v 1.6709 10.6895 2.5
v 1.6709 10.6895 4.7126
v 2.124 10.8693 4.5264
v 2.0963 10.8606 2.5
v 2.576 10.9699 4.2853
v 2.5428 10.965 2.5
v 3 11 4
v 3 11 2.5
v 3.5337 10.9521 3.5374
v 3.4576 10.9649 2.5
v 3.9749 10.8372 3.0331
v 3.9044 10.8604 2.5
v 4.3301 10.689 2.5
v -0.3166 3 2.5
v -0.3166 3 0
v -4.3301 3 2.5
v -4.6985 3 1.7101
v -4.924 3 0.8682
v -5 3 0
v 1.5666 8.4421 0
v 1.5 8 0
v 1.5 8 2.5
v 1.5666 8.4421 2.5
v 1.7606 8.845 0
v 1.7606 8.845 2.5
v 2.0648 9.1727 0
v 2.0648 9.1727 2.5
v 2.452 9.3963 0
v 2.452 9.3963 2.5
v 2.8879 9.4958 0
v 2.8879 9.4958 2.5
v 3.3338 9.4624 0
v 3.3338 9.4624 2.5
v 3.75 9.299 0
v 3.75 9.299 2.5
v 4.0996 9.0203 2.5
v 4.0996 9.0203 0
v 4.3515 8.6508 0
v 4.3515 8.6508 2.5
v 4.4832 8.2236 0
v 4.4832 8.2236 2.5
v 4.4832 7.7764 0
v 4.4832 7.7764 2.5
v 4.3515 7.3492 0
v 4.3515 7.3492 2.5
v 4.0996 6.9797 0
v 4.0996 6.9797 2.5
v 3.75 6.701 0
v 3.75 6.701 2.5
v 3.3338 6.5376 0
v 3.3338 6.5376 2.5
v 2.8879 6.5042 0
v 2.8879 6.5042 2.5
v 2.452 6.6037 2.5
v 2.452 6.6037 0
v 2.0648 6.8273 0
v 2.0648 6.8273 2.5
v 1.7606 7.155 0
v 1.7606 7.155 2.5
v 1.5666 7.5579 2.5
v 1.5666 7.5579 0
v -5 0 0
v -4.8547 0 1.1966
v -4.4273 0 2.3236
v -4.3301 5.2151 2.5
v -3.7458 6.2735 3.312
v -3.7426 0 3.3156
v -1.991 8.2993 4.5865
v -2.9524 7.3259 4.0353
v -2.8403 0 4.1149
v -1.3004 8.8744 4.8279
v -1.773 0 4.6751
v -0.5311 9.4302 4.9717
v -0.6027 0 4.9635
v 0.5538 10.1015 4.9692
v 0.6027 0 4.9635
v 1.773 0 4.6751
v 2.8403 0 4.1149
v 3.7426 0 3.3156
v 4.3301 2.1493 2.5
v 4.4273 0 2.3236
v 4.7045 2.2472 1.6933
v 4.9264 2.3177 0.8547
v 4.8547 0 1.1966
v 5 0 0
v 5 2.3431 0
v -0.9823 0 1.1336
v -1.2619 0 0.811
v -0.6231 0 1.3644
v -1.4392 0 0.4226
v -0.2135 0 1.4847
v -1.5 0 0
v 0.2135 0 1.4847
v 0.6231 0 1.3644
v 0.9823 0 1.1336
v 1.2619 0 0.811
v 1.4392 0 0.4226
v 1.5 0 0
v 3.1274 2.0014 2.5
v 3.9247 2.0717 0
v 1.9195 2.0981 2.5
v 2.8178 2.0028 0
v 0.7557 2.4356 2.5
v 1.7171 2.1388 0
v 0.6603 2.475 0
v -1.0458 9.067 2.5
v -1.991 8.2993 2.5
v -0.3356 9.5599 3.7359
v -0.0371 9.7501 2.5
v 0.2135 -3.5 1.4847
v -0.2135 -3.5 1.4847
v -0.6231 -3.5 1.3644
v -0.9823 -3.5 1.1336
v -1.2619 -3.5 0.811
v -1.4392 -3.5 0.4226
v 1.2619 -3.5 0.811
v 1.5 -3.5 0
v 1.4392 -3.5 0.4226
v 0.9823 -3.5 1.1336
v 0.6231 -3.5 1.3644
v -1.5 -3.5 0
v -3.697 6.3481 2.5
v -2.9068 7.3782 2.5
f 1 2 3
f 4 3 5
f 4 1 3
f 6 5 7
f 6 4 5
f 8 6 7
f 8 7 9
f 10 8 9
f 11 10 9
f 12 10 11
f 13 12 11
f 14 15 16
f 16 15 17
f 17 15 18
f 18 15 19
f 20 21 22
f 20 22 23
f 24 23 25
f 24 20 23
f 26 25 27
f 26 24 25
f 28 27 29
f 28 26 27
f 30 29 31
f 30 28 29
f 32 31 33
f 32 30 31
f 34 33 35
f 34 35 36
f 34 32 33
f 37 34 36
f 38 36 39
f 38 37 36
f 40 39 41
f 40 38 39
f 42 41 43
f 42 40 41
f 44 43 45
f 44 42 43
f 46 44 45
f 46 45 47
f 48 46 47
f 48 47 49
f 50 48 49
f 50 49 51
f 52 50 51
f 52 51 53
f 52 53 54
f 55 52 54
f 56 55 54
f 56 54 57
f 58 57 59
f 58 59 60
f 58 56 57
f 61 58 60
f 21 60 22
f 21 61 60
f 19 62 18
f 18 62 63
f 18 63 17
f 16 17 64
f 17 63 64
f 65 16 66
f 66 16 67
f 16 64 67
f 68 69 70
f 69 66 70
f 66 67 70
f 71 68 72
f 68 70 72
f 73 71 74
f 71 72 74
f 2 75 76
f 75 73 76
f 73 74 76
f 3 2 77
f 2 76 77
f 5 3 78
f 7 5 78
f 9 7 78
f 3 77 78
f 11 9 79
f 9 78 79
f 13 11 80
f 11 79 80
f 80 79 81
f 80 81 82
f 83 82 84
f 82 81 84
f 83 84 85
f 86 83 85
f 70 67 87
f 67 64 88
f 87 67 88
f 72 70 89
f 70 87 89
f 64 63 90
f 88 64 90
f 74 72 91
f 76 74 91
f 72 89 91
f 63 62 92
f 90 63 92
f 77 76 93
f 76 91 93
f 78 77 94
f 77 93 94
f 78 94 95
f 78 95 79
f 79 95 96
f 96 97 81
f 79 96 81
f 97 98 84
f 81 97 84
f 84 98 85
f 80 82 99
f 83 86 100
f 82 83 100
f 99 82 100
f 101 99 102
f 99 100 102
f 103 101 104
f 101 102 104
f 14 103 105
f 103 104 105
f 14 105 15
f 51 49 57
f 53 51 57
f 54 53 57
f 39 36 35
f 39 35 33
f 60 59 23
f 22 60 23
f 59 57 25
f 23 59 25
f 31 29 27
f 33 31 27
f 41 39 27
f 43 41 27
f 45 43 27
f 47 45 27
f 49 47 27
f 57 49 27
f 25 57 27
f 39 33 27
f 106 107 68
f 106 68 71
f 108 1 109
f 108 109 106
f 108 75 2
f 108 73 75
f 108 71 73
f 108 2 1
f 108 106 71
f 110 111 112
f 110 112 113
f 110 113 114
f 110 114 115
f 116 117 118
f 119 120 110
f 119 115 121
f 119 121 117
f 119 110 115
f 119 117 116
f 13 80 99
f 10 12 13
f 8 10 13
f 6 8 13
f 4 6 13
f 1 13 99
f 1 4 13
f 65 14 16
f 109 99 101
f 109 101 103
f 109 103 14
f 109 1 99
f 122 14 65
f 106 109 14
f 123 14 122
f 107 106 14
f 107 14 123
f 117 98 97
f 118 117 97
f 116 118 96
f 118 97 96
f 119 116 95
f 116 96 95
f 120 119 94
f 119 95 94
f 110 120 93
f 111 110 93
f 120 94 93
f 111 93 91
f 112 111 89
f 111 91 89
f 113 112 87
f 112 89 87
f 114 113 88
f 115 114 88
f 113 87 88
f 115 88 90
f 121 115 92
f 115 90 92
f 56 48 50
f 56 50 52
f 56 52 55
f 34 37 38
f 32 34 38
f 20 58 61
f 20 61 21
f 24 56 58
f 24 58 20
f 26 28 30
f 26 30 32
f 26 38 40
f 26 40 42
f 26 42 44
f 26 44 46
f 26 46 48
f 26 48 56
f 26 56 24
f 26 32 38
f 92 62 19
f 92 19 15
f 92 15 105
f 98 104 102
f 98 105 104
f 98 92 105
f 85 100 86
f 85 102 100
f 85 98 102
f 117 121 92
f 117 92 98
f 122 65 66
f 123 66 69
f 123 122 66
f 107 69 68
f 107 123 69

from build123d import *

# Parameters (mm, degrees)
SKETCH1_R               = 5
BOSS_EXTRUDE1_DEPTH     = 13
CUT_EXTRUDE1_DEPTH      = 6
CUT_EXTRUDE1_DEPTH_BACK = 6
CUT_EXTRUDE5_DEPTH      = 12.000000091
CUT_EXTRUDE5_DEPTH_BACK = 1.0000001
CUT_EXTRUDE6_DEPTH      = 2.5
SKETCH6_R               = 1.5
BOSS_EXTRUDE2_DEPTH     = 2.5
BOSS_EXTRUDE3_DEPTH     = 3.5
SKETCH8_R               = 6
SKETCH8_R_2             = 1.5
CUT_EXTRUDE8_DEPTH      = 2.5


with BuildPart() as part:
    # Sketch1 → Boss-Extrude1 (new body)
    with BuildSketch(Plane(origin=(0, 0, 0), x_dir=(1, 0, 0), z_dir=(0, 1, 0))):
        Circle(SKETCH1_R)
    extrude(amount=BOSS_EXTRUDE1_DEPTH)

    # Sketch2 → Cut-Extrude1 (cut, two sides)
    with BuildSketch(Plane.XY) as cut_extrude1_sk:
        with BuildLine():
            Line((3, 13), (0, 13))
            Line((0, 13), (-5, 13))
            Line((-5, 13), (-5, 3))
            add(Edge.make_bspline(
                [(-5, 3), (-4.520998695, 6.032498319), (-1.99103132, 8.299343225)],
                knots=[0.227620842, 0.227620842, 0.227620842, 0.714929142, 0.714929142, 0.714929142], degree=2))
            ThreePointArc((-1.99103132, 8.299343225), (-0.428066793, 11.6398294), (3, 13))
        make_face()
        with BuildLine():
            Line((3, 11), (3, 13))
            ThreePointArc((3, 13), (-0.428066793, 11.6398294), (-1.99103132, 8.299343225))
            add(Edge.make_bspline(
                [(-1.99103132, 8.299343225), (-0.511023752, 9.625426577), (1.670853534, 10.689492456)],
                knots=[0.714929142, 0.714929142, 0.714929142, 1, 1, 1], degree=2))
            ThreePointArc((1.670853534, 10.689492456), (2.317532919, 10.921341932), (3, 11))
        make_face()
        with BuildLine():
            ThreePointArc((5, 12.582575695), (4.021548218, 12.894531565), (3, 13))
            Line((3, 13), (3, 11))
            ThreePointArc((3, 11), (4.070466269, 10.802517077), (5, 10.236067977))
            Line((5, 10.236067977), (5, 12.582575695))
        make_face()
        with BuildLine():
            ThreePointArc((8, 8), (7.183300133, 10.738612788), (5, 12.582575695))
            Line((5, 12.582575695), (5, 10.236067977))
            ThreePointArc((5, 10.236067977), (5.738612788, 9.224744871), (6, 8))
            ThreePointArc((6, 8), (5.9642797, 7.538431086), (5.857969425, 7.08785376))
            ThreePointArc((5.857969425, 7.08785376), (5.845570523, 7.049879797), (5.832667083, 7.012074296))
            add(Edge.make_bspline(
                [(5.04344694, 3.436632318), (5.24663774, 5.244224617), (5.832667083, 7.012074296)],
                knots=[0.479473452, 0.479473452, 0.479473452, 0.989075242, 0.989075242, 0.989075242], degree=2))
            ThreePointArc((5.04344694, 3.436632318), (7.196262307, 5.28129026), (8, 8))
        make_face()
        with BuildLine():
            Line((5, 5.763932023), (5, 3.417424305))
            ThreePointArc((5, 3.417424305), (5.021746281, 3.426976714), (5.04344694, 3.436632318))
            add(Edge.make_bspline(
                [(5.04344694, 3.436632318), (5.24663774, 5.244224617), (5.832667083, 7.012074296)],
                knots=[0.479473452, 0.479473452, 0.479473452, 0.989075242, 0.989075242, 0.989075242], degree=2))
            ThreePointArc((5.832667083, 7.012074296), (5.495622681, 6.335107381), (5, 5.763932023))
        make_face()
        with BuildLine():
            Line((5, 13), (3, 13))
            ThreePointArc((3, 13), (4.021548218, 12.894531565), (5, 12.582575695))
            Line((5, 12.582575695), (5, 13))
        make_face()
    extrude(amount=CUT_EXTRUDE1_DEPTH, mode=Mode.SUBTRACT)
    extrude(cut_extrude1_sk.sketch, amount=-CUT_EXTRUDE1_DEPTH_BACK, mode=Mode.SUBTRACT)

    # Sketch4 → Cut-Extrude5 (cut, two sides)
    with BuildSketch(Plane(origin=(0, 0, 0), x_dir=(1, 0, 0), z_dir=(0, 1, 0))) as cut_extrude5_sk:
        Polygon((0, 0), (-5.690111437, 0), (-5.690111437, 7.683278955), (11.026883972, 8.496072863), (8.601615285, 0), align=None)
    extrude(amount=CUT_EXTRUDE5_DEPTH, mode=Mode.SUBTRACT)
    extrude(cut_extrude5_sk.sketch, amount=-CUT_EXTRUDE5_DEPTH_BACK, mode=Mode.SUBTRACT)

    # Sketch5 → Cut-Extrude6 (cut)
    with BuildSketch(Plane(origin=(0, 0, 0), x_dir=(-1, 0, 0), z_dir=(0, 0, -1))):
        Polygon((0, 3), (-6.67084339, 3), (-6.67084339, 14.94999742), (5.657152112, 14.94999742), (5.977359788, 3), align=None)
    extrude(amount=-CUT_EXTRUDE6_DEPTH, mode=Mode.SUBTRACT)

    # Sketch7 → Boss-Extrude3 (add)
    with BuildSketch(Plane.XZ):
        with BuildLine():
            ThreePointArc((1.5, 0), (0, 1.5), (-1.5, 0))
            Line((-1.5, 0), (1.5, 0))
        make_face()
    extrude(amount=BOSS_EXTRUDE3_DEPTH)

    # Sketch8 → Cut-Extrude8 (cut)
    with BuildSketch(Plane(origin=(0, 0, 0), x_dir=(-1, 0, 0), z_dir=(0, 0, -1))):
        with Locations((-3, 8)):
            Circle(SKETCH8_R)
        with Locations((-3, 8)):
            Circle(SKETCH8_R_2, mode=Mode.SUBTRACT)
    extrude(amount=-CUT_EXTRUDE8_DEPTH, mode=Mode.SUBTRACT)


with BuildPart() as body_2:
    # Sketch6 → Boss-Extrude2 (new body)
    with BuildSketch(Plane(origin=(0, 0, 0), x_dir=(-1, 0, 0), z_dir=(0, 0, -1))):
        with Locations((-3, 8)):
            Circle(SKETCH6_R)
    extrude(amount=-BOSS_EXTRUDE2_DEPTH)


solid = Compound([part.part, body_2.part])
